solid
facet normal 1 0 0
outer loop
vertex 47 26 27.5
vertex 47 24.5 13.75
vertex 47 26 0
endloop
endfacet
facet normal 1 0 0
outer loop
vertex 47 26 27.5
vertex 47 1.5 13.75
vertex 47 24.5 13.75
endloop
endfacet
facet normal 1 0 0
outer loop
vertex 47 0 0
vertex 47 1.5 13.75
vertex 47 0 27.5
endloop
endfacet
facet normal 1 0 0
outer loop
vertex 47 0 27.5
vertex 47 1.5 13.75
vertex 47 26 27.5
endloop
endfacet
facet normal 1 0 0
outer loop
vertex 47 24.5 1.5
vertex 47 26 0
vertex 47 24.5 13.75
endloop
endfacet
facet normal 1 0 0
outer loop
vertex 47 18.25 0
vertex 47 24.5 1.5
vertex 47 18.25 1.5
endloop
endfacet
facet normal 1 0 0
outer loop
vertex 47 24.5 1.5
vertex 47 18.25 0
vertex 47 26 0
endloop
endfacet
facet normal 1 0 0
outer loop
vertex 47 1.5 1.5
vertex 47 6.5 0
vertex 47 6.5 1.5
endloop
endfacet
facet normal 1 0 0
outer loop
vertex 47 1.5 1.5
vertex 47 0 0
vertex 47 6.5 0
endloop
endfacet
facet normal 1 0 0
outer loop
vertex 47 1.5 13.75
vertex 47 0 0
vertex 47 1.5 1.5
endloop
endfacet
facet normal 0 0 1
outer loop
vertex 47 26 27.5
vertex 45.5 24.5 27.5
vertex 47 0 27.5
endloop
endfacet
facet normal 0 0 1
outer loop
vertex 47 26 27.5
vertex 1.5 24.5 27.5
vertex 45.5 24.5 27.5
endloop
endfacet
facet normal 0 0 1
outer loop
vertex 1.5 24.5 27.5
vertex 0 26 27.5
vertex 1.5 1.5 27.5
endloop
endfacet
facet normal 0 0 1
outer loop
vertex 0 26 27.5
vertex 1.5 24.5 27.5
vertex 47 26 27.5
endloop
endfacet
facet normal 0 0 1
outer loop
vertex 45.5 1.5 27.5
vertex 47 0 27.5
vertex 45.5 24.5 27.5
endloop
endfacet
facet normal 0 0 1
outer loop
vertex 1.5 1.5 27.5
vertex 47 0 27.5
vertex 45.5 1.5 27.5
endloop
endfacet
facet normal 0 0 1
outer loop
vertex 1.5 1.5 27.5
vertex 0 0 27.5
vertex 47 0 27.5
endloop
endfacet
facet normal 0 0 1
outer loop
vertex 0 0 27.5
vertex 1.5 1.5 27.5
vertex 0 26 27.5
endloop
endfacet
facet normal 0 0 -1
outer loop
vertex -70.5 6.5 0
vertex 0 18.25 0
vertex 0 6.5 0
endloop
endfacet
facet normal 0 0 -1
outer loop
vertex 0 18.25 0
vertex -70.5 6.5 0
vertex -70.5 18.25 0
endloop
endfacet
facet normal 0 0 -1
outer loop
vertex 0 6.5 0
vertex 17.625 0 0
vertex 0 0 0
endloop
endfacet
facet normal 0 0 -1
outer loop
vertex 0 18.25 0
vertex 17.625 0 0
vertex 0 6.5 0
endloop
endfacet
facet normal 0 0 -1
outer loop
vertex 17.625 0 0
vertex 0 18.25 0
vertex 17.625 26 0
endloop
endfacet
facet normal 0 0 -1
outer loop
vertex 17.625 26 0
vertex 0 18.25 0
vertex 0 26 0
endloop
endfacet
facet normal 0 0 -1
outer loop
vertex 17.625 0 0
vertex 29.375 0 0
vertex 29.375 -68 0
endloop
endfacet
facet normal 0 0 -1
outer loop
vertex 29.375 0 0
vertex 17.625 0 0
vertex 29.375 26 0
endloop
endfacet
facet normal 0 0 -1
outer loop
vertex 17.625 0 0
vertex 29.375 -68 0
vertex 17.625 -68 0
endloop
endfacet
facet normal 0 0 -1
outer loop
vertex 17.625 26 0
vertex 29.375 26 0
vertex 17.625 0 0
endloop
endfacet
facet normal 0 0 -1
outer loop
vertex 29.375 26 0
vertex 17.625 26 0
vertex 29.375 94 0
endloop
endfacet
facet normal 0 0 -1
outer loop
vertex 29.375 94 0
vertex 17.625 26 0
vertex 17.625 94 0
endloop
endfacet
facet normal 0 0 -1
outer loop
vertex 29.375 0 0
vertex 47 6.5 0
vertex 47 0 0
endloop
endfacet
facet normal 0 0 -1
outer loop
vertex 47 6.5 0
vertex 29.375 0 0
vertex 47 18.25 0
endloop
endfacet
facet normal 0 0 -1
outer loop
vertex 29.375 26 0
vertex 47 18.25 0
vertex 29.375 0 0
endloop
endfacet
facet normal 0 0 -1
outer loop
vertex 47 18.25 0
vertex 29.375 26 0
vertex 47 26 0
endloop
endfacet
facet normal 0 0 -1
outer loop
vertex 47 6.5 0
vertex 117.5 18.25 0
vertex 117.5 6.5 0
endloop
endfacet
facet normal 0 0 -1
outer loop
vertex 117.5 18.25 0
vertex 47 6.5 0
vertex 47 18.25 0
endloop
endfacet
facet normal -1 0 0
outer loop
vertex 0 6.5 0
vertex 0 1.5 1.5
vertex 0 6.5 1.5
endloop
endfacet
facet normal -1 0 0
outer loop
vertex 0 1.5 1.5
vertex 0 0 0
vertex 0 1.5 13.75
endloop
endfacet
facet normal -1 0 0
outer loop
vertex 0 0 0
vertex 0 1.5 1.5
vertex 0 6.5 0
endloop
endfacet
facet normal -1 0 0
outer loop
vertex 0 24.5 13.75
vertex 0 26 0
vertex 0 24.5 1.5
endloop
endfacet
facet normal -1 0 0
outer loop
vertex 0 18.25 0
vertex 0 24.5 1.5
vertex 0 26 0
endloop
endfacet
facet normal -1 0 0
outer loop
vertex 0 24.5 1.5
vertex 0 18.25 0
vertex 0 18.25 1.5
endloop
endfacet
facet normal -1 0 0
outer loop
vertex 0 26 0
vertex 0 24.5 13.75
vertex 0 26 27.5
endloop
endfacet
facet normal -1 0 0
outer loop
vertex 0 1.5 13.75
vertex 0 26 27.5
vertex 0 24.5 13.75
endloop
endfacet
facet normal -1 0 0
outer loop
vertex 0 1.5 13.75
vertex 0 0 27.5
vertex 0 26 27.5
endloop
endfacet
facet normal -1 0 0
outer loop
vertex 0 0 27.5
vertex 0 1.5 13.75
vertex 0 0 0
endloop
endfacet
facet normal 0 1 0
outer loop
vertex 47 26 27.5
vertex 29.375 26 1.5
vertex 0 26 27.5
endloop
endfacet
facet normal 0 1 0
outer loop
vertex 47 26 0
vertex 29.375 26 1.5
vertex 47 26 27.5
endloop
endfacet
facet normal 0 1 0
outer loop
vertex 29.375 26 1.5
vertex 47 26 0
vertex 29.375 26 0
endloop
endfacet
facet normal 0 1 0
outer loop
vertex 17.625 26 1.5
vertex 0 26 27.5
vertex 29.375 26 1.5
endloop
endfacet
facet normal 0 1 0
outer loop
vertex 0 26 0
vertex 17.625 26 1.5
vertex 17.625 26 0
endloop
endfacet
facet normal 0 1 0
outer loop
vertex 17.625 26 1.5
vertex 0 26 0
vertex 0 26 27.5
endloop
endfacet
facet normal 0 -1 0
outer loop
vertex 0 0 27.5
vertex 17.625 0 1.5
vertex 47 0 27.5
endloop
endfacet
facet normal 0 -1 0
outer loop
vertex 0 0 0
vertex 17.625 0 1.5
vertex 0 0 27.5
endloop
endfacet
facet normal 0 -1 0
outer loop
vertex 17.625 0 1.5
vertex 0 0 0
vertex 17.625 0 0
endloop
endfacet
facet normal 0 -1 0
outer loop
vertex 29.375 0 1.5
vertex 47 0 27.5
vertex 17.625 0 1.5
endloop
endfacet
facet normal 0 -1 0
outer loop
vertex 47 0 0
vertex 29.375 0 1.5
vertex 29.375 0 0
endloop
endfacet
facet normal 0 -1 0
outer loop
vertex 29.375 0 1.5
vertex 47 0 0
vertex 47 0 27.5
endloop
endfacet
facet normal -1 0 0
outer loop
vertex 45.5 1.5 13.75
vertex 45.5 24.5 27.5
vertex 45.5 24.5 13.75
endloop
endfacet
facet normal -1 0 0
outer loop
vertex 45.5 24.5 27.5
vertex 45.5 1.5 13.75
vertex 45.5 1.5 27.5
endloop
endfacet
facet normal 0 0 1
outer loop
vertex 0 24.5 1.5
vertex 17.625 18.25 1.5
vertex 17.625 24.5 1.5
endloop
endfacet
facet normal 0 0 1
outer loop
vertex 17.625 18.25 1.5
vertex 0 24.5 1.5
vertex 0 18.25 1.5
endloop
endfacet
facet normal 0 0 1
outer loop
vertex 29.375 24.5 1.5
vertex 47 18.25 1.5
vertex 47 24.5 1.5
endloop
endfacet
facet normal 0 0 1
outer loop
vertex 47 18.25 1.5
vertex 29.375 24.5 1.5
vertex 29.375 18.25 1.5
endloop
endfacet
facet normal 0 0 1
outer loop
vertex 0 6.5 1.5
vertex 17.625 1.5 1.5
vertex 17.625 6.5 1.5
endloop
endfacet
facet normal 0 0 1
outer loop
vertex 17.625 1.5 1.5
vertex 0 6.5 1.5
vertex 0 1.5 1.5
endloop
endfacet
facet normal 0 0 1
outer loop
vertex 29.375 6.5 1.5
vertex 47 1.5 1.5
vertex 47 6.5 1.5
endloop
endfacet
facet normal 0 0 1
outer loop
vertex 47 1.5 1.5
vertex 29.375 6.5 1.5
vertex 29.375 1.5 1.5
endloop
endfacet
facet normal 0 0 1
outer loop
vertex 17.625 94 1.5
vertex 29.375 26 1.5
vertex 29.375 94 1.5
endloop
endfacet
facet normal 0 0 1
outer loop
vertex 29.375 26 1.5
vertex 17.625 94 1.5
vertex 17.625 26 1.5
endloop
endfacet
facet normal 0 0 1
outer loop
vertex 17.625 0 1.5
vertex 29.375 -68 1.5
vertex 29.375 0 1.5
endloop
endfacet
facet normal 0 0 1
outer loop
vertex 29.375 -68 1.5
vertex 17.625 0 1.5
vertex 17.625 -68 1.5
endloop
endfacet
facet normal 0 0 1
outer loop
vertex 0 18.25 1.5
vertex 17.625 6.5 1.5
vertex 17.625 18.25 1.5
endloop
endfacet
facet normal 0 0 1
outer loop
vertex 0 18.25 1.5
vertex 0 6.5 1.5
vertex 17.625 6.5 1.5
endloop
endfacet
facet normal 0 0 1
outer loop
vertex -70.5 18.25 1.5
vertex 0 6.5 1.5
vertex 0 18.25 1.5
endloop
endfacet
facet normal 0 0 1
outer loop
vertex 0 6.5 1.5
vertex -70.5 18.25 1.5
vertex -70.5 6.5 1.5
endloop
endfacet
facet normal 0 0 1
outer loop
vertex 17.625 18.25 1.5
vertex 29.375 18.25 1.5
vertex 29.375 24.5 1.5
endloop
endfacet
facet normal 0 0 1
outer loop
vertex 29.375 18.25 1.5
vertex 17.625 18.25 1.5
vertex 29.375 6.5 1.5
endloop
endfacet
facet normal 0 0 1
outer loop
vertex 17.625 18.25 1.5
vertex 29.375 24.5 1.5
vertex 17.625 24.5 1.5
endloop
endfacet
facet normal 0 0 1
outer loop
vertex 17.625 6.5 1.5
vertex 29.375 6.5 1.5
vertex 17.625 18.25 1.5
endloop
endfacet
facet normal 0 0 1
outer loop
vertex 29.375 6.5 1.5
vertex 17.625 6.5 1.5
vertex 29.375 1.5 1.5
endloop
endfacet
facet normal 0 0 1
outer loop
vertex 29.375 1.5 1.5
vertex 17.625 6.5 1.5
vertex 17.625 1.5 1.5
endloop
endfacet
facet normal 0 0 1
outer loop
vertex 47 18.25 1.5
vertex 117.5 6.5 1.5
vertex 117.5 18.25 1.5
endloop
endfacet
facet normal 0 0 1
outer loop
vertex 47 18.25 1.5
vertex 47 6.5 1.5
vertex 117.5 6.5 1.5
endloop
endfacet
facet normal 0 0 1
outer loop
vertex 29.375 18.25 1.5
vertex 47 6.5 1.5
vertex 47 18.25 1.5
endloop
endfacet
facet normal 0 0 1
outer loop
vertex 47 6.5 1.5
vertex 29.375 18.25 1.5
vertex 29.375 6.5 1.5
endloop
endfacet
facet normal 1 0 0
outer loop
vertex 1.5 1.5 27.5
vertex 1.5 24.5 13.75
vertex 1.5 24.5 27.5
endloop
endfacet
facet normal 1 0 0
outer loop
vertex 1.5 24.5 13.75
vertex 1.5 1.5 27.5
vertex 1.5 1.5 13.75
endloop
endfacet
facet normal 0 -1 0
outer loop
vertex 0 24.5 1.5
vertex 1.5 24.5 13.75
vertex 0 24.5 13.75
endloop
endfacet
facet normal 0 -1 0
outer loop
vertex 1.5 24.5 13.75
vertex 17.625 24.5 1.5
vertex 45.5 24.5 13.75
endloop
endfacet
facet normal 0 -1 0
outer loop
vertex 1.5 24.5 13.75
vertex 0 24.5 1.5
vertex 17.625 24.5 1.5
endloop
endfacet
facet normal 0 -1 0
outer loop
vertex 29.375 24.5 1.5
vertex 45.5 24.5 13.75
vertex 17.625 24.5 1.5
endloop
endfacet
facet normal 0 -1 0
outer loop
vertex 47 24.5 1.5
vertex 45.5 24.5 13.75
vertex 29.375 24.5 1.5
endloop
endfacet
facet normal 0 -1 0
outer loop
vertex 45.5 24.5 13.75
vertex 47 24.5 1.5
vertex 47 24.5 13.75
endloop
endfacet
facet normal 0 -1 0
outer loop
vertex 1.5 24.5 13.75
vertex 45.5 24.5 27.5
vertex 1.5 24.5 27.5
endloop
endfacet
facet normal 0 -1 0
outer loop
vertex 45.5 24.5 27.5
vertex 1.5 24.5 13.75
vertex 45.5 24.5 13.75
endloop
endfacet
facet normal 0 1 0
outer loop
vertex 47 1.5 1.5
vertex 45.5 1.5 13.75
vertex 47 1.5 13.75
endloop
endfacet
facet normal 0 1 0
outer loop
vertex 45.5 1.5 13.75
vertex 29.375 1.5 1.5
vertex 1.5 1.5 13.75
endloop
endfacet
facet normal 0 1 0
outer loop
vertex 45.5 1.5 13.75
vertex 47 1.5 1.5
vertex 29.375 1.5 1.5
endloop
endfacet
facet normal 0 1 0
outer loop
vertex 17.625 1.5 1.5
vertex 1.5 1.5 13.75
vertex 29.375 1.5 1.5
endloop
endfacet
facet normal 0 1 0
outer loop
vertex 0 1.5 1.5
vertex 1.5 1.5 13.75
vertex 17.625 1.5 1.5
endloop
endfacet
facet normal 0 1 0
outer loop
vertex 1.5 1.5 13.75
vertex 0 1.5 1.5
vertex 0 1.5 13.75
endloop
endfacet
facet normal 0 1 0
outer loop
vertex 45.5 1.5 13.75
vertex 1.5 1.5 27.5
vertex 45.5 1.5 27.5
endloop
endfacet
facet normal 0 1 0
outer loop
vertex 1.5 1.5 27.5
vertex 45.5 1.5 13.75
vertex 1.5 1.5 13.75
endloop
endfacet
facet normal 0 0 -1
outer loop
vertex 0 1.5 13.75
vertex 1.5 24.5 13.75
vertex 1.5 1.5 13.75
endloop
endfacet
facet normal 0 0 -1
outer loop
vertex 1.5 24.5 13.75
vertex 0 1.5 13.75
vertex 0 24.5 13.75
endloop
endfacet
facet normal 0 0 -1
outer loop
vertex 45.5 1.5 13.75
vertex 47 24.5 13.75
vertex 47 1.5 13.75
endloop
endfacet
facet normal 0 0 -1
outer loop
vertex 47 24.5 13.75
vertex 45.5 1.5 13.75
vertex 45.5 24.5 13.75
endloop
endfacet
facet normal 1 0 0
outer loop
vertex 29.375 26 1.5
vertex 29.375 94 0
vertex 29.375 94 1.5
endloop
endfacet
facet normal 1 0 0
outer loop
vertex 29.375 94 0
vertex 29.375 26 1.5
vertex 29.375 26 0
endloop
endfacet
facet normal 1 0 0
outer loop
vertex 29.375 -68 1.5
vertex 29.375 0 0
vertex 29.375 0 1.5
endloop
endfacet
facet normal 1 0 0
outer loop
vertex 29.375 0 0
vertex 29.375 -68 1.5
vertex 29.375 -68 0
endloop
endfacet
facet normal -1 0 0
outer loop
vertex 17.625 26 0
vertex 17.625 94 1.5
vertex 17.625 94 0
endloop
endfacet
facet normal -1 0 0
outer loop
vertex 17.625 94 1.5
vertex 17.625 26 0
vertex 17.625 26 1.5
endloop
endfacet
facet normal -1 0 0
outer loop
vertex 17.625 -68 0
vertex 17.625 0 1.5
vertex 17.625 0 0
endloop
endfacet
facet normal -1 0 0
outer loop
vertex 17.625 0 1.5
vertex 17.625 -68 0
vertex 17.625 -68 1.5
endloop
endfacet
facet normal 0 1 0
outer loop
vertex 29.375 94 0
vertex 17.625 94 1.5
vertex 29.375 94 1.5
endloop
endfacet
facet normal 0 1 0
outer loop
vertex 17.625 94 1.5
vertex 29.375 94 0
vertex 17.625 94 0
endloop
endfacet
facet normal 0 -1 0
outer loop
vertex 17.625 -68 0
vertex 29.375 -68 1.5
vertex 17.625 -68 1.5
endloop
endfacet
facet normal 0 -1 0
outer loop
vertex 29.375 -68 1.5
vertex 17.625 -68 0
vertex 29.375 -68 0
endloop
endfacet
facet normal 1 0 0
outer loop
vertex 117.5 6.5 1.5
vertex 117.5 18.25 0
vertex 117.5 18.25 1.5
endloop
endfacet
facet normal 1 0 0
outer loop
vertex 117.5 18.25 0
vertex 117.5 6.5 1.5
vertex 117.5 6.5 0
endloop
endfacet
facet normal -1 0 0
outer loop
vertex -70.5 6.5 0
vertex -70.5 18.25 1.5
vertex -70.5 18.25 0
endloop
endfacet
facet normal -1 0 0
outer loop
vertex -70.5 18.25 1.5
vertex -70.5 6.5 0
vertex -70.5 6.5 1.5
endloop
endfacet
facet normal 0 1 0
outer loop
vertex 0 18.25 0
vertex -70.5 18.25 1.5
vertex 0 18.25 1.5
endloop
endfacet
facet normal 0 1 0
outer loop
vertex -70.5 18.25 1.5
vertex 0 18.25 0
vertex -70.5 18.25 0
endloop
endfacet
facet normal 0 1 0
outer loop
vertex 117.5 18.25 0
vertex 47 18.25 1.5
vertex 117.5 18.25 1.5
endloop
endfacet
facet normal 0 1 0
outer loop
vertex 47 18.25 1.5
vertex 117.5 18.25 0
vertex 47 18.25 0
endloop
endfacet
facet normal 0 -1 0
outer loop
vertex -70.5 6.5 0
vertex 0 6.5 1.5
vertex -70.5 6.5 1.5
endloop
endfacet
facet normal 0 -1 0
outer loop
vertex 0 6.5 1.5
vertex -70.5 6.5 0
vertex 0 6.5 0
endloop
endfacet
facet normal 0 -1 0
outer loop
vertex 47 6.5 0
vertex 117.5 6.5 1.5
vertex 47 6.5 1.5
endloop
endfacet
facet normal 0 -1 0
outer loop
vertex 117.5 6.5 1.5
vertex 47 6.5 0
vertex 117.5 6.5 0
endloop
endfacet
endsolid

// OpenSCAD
module base(tick, B, D, F) {
    // Inside is equal to servo dimensions plus tick
    // Extra space
    Extra= 1.5;
    B=B+tick*2+(Extra*2);
    D=D+tick*2+(Extra*2);
    F=F+tick;
    
    union() {
        difference() {
            cube([B,D,F]);
            // Z
            translate([tick,tick,tick]) cube([B-(tick*2),D-(tick*2),F]);
            // X
            translate([-1,tick,tick]) cube([B+2,D-(tick*2),F/2-tick]);
            // Y
            translate([tick,tick,tick]) cube([B-(tick*2),D-(tick*2),F-(tick*2)]);  
        }
    
     // Legs
    translate([B/2-B/8,-B*2+D,0]) cube([B/4,B*4-D,tick]);
    translate([-B*2+B/2,D/2-D/4,0]) cube([B*4,B/4,tick]);
    }
   
}


base(1.5, 41, 20, 26, 20);
